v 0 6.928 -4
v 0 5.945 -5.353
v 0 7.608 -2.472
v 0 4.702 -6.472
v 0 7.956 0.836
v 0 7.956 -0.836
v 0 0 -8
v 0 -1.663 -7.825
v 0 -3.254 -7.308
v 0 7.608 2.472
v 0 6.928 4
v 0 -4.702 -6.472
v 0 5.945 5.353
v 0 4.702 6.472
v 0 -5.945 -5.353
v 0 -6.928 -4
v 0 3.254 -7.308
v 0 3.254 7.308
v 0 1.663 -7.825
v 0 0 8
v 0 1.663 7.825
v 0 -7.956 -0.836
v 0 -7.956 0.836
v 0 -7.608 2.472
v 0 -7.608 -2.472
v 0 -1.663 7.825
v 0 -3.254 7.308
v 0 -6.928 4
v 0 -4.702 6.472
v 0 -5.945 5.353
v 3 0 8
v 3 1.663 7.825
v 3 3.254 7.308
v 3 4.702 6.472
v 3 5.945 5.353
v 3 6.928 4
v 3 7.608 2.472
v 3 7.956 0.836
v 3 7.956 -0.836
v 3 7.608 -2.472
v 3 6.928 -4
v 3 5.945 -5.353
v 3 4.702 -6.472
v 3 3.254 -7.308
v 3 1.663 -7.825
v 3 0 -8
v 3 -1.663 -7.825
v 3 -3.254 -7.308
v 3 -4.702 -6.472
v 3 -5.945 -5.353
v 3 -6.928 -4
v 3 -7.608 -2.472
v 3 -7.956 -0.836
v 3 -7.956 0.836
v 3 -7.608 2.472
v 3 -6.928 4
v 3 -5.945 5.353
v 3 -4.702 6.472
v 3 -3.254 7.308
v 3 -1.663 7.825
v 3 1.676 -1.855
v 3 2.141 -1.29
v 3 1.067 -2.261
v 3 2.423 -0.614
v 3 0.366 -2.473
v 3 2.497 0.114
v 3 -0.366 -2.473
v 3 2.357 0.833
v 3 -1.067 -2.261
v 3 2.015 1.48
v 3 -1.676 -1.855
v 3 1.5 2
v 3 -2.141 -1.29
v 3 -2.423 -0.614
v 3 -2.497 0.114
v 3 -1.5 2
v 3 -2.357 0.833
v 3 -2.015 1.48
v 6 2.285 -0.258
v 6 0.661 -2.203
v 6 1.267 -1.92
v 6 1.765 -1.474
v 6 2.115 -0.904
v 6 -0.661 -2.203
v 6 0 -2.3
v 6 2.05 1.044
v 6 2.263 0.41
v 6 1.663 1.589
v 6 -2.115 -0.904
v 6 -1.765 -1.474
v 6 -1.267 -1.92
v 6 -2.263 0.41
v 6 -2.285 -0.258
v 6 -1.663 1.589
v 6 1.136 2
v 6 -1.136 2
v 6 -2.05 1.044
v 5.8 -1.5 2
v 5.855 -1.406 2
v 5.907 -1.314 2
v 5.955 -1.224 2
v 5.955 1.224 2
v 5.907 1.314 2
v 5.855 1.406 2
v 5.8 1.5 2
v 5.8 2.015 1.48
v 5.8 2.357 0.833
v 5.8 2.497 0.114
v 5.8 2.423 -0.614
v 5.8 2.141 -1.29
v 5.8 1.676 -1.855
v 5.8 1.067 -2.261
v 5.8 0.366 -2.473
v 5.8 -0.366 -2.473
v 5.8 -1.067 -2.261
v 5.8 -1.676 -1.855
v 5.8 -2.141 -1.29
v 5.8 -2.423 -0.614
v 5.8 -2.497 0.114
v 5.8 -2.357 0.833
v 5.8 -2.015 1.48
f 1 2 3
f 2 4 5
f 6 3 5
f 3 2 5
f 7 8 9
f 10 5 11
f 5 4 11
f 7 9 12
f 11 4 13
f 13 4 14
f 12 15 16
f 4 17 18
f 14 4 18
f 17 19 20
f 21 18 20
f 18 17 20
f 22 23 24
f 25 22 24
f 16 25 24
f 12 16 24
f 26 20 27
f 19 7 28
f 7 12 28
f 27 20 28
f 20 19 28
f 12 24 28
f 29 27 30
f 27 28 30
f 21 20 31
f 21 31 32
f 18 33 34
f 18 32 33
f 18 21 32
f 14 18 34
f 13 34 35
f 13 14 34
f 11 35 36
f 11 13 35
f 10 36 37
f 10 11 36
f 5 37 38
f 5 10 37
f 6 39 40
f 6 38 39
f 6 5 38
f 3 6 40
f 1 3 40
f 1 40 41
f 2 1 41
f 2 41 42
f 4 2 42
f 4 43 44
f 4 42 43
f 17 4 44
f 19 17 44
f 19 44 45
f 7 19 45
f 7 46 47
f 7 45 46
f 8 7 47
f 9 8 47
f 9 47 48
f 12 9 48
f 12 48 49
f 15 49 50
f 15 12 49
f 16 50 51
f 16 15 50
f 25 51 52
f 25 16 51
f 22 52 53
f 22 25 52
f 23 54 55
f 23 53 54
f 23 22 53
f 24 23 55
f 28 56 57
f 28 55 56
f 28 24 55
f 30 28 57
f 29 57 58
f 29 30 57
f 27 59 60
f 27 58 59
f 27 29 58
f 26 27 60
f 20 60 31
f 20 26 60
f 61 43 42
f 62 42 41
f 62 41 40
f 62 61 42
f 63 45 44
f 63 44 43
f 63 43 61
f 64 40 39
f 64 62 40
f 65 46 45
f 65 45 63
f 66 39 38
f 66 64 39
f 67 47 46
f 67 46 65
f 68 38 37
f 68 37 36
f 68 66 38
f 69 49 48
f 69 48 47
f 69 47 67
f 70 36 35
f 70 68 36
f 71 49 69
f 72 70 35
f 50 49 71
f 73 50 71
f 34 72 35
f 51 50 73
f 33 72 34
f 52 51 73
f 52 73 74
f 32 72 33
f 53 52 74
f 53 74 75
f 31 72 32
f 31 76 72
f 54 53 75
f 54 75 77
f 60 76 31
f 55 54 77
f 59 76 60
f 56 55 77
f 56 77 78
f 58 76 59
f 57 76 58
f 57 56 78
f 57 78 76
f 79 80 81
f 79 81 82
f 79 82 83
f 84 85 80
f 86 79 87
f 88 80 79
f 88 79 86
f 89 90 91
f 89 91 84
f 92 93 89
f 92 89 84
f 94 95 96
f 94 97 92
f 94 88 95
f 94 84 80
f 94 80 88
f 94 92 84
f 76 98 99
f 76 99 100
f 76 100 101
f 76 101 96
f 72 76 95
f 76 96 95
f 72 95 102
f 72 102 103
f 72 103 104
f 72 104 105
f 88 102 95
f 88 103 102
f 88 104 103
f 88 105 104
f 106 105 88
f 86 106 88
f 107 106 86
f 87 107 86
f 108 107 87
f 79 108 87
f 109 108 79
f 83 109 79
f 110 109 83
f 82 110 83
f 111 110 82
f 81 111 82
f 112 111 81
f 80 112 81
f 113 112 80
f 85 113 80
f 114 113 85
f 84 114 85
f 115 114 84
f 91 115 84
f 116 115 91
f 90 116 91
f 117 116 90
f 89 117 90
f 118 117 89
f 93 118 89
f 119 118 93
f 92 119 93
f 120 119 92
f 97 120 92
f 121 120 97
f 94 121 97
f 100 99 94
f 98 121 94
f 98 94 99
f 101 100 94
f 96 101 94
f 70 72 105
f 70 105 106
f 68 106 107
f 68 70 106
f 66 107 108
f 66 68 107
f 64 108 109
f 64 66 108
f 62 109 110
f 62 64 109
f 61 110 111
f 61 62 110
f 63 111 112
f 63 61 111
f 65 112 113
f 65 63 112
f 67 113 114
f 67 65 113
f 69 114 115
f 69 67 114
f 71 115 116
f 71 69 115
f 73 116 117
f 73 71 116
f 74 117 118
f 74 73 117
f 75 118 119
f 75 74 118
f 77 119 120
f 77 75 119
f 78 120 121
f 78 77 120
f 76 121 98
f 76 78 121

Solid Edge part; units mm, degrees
sketch "Sketch1" plane through (0, 0, 0) normal (0, -1, 0) x (1, 0, 0)
  line L0 (6, 2.5) -> (3, 2.5)
  line L1 (3, 2.5) -> (3, 8)
  line L2 (3, 8) -> (0, 8)
  line L3 (0, 8) -> (0, 0)
  line L4 (6, 0) -> (6, 2.5)
  dimension "D1" = 3
  dimension "D2" = 3
revolve "RevolvedProtrusion1" add sketch "Sketch1" angle 360 about axis through (0, 0, 0) along (1, 0, 0)
chamfer "Chamfer1" distance 0.2 angle 45 1 edges at (6, 0, -2.5)
sketch "Sketch2" plane through (6, 0, 0) normal (1, 0, 0) x (0, 1, 0)
  line L0 (-1.5, 2) -> (1.5, 2)
  arc A0 (1.5, 2) -> (-1.5, 2) centre (0, 0) cw
extrude "Extrusionsausschnitt_1" cut sketch "Sketch2" against normal blind 3 flip side to cut
